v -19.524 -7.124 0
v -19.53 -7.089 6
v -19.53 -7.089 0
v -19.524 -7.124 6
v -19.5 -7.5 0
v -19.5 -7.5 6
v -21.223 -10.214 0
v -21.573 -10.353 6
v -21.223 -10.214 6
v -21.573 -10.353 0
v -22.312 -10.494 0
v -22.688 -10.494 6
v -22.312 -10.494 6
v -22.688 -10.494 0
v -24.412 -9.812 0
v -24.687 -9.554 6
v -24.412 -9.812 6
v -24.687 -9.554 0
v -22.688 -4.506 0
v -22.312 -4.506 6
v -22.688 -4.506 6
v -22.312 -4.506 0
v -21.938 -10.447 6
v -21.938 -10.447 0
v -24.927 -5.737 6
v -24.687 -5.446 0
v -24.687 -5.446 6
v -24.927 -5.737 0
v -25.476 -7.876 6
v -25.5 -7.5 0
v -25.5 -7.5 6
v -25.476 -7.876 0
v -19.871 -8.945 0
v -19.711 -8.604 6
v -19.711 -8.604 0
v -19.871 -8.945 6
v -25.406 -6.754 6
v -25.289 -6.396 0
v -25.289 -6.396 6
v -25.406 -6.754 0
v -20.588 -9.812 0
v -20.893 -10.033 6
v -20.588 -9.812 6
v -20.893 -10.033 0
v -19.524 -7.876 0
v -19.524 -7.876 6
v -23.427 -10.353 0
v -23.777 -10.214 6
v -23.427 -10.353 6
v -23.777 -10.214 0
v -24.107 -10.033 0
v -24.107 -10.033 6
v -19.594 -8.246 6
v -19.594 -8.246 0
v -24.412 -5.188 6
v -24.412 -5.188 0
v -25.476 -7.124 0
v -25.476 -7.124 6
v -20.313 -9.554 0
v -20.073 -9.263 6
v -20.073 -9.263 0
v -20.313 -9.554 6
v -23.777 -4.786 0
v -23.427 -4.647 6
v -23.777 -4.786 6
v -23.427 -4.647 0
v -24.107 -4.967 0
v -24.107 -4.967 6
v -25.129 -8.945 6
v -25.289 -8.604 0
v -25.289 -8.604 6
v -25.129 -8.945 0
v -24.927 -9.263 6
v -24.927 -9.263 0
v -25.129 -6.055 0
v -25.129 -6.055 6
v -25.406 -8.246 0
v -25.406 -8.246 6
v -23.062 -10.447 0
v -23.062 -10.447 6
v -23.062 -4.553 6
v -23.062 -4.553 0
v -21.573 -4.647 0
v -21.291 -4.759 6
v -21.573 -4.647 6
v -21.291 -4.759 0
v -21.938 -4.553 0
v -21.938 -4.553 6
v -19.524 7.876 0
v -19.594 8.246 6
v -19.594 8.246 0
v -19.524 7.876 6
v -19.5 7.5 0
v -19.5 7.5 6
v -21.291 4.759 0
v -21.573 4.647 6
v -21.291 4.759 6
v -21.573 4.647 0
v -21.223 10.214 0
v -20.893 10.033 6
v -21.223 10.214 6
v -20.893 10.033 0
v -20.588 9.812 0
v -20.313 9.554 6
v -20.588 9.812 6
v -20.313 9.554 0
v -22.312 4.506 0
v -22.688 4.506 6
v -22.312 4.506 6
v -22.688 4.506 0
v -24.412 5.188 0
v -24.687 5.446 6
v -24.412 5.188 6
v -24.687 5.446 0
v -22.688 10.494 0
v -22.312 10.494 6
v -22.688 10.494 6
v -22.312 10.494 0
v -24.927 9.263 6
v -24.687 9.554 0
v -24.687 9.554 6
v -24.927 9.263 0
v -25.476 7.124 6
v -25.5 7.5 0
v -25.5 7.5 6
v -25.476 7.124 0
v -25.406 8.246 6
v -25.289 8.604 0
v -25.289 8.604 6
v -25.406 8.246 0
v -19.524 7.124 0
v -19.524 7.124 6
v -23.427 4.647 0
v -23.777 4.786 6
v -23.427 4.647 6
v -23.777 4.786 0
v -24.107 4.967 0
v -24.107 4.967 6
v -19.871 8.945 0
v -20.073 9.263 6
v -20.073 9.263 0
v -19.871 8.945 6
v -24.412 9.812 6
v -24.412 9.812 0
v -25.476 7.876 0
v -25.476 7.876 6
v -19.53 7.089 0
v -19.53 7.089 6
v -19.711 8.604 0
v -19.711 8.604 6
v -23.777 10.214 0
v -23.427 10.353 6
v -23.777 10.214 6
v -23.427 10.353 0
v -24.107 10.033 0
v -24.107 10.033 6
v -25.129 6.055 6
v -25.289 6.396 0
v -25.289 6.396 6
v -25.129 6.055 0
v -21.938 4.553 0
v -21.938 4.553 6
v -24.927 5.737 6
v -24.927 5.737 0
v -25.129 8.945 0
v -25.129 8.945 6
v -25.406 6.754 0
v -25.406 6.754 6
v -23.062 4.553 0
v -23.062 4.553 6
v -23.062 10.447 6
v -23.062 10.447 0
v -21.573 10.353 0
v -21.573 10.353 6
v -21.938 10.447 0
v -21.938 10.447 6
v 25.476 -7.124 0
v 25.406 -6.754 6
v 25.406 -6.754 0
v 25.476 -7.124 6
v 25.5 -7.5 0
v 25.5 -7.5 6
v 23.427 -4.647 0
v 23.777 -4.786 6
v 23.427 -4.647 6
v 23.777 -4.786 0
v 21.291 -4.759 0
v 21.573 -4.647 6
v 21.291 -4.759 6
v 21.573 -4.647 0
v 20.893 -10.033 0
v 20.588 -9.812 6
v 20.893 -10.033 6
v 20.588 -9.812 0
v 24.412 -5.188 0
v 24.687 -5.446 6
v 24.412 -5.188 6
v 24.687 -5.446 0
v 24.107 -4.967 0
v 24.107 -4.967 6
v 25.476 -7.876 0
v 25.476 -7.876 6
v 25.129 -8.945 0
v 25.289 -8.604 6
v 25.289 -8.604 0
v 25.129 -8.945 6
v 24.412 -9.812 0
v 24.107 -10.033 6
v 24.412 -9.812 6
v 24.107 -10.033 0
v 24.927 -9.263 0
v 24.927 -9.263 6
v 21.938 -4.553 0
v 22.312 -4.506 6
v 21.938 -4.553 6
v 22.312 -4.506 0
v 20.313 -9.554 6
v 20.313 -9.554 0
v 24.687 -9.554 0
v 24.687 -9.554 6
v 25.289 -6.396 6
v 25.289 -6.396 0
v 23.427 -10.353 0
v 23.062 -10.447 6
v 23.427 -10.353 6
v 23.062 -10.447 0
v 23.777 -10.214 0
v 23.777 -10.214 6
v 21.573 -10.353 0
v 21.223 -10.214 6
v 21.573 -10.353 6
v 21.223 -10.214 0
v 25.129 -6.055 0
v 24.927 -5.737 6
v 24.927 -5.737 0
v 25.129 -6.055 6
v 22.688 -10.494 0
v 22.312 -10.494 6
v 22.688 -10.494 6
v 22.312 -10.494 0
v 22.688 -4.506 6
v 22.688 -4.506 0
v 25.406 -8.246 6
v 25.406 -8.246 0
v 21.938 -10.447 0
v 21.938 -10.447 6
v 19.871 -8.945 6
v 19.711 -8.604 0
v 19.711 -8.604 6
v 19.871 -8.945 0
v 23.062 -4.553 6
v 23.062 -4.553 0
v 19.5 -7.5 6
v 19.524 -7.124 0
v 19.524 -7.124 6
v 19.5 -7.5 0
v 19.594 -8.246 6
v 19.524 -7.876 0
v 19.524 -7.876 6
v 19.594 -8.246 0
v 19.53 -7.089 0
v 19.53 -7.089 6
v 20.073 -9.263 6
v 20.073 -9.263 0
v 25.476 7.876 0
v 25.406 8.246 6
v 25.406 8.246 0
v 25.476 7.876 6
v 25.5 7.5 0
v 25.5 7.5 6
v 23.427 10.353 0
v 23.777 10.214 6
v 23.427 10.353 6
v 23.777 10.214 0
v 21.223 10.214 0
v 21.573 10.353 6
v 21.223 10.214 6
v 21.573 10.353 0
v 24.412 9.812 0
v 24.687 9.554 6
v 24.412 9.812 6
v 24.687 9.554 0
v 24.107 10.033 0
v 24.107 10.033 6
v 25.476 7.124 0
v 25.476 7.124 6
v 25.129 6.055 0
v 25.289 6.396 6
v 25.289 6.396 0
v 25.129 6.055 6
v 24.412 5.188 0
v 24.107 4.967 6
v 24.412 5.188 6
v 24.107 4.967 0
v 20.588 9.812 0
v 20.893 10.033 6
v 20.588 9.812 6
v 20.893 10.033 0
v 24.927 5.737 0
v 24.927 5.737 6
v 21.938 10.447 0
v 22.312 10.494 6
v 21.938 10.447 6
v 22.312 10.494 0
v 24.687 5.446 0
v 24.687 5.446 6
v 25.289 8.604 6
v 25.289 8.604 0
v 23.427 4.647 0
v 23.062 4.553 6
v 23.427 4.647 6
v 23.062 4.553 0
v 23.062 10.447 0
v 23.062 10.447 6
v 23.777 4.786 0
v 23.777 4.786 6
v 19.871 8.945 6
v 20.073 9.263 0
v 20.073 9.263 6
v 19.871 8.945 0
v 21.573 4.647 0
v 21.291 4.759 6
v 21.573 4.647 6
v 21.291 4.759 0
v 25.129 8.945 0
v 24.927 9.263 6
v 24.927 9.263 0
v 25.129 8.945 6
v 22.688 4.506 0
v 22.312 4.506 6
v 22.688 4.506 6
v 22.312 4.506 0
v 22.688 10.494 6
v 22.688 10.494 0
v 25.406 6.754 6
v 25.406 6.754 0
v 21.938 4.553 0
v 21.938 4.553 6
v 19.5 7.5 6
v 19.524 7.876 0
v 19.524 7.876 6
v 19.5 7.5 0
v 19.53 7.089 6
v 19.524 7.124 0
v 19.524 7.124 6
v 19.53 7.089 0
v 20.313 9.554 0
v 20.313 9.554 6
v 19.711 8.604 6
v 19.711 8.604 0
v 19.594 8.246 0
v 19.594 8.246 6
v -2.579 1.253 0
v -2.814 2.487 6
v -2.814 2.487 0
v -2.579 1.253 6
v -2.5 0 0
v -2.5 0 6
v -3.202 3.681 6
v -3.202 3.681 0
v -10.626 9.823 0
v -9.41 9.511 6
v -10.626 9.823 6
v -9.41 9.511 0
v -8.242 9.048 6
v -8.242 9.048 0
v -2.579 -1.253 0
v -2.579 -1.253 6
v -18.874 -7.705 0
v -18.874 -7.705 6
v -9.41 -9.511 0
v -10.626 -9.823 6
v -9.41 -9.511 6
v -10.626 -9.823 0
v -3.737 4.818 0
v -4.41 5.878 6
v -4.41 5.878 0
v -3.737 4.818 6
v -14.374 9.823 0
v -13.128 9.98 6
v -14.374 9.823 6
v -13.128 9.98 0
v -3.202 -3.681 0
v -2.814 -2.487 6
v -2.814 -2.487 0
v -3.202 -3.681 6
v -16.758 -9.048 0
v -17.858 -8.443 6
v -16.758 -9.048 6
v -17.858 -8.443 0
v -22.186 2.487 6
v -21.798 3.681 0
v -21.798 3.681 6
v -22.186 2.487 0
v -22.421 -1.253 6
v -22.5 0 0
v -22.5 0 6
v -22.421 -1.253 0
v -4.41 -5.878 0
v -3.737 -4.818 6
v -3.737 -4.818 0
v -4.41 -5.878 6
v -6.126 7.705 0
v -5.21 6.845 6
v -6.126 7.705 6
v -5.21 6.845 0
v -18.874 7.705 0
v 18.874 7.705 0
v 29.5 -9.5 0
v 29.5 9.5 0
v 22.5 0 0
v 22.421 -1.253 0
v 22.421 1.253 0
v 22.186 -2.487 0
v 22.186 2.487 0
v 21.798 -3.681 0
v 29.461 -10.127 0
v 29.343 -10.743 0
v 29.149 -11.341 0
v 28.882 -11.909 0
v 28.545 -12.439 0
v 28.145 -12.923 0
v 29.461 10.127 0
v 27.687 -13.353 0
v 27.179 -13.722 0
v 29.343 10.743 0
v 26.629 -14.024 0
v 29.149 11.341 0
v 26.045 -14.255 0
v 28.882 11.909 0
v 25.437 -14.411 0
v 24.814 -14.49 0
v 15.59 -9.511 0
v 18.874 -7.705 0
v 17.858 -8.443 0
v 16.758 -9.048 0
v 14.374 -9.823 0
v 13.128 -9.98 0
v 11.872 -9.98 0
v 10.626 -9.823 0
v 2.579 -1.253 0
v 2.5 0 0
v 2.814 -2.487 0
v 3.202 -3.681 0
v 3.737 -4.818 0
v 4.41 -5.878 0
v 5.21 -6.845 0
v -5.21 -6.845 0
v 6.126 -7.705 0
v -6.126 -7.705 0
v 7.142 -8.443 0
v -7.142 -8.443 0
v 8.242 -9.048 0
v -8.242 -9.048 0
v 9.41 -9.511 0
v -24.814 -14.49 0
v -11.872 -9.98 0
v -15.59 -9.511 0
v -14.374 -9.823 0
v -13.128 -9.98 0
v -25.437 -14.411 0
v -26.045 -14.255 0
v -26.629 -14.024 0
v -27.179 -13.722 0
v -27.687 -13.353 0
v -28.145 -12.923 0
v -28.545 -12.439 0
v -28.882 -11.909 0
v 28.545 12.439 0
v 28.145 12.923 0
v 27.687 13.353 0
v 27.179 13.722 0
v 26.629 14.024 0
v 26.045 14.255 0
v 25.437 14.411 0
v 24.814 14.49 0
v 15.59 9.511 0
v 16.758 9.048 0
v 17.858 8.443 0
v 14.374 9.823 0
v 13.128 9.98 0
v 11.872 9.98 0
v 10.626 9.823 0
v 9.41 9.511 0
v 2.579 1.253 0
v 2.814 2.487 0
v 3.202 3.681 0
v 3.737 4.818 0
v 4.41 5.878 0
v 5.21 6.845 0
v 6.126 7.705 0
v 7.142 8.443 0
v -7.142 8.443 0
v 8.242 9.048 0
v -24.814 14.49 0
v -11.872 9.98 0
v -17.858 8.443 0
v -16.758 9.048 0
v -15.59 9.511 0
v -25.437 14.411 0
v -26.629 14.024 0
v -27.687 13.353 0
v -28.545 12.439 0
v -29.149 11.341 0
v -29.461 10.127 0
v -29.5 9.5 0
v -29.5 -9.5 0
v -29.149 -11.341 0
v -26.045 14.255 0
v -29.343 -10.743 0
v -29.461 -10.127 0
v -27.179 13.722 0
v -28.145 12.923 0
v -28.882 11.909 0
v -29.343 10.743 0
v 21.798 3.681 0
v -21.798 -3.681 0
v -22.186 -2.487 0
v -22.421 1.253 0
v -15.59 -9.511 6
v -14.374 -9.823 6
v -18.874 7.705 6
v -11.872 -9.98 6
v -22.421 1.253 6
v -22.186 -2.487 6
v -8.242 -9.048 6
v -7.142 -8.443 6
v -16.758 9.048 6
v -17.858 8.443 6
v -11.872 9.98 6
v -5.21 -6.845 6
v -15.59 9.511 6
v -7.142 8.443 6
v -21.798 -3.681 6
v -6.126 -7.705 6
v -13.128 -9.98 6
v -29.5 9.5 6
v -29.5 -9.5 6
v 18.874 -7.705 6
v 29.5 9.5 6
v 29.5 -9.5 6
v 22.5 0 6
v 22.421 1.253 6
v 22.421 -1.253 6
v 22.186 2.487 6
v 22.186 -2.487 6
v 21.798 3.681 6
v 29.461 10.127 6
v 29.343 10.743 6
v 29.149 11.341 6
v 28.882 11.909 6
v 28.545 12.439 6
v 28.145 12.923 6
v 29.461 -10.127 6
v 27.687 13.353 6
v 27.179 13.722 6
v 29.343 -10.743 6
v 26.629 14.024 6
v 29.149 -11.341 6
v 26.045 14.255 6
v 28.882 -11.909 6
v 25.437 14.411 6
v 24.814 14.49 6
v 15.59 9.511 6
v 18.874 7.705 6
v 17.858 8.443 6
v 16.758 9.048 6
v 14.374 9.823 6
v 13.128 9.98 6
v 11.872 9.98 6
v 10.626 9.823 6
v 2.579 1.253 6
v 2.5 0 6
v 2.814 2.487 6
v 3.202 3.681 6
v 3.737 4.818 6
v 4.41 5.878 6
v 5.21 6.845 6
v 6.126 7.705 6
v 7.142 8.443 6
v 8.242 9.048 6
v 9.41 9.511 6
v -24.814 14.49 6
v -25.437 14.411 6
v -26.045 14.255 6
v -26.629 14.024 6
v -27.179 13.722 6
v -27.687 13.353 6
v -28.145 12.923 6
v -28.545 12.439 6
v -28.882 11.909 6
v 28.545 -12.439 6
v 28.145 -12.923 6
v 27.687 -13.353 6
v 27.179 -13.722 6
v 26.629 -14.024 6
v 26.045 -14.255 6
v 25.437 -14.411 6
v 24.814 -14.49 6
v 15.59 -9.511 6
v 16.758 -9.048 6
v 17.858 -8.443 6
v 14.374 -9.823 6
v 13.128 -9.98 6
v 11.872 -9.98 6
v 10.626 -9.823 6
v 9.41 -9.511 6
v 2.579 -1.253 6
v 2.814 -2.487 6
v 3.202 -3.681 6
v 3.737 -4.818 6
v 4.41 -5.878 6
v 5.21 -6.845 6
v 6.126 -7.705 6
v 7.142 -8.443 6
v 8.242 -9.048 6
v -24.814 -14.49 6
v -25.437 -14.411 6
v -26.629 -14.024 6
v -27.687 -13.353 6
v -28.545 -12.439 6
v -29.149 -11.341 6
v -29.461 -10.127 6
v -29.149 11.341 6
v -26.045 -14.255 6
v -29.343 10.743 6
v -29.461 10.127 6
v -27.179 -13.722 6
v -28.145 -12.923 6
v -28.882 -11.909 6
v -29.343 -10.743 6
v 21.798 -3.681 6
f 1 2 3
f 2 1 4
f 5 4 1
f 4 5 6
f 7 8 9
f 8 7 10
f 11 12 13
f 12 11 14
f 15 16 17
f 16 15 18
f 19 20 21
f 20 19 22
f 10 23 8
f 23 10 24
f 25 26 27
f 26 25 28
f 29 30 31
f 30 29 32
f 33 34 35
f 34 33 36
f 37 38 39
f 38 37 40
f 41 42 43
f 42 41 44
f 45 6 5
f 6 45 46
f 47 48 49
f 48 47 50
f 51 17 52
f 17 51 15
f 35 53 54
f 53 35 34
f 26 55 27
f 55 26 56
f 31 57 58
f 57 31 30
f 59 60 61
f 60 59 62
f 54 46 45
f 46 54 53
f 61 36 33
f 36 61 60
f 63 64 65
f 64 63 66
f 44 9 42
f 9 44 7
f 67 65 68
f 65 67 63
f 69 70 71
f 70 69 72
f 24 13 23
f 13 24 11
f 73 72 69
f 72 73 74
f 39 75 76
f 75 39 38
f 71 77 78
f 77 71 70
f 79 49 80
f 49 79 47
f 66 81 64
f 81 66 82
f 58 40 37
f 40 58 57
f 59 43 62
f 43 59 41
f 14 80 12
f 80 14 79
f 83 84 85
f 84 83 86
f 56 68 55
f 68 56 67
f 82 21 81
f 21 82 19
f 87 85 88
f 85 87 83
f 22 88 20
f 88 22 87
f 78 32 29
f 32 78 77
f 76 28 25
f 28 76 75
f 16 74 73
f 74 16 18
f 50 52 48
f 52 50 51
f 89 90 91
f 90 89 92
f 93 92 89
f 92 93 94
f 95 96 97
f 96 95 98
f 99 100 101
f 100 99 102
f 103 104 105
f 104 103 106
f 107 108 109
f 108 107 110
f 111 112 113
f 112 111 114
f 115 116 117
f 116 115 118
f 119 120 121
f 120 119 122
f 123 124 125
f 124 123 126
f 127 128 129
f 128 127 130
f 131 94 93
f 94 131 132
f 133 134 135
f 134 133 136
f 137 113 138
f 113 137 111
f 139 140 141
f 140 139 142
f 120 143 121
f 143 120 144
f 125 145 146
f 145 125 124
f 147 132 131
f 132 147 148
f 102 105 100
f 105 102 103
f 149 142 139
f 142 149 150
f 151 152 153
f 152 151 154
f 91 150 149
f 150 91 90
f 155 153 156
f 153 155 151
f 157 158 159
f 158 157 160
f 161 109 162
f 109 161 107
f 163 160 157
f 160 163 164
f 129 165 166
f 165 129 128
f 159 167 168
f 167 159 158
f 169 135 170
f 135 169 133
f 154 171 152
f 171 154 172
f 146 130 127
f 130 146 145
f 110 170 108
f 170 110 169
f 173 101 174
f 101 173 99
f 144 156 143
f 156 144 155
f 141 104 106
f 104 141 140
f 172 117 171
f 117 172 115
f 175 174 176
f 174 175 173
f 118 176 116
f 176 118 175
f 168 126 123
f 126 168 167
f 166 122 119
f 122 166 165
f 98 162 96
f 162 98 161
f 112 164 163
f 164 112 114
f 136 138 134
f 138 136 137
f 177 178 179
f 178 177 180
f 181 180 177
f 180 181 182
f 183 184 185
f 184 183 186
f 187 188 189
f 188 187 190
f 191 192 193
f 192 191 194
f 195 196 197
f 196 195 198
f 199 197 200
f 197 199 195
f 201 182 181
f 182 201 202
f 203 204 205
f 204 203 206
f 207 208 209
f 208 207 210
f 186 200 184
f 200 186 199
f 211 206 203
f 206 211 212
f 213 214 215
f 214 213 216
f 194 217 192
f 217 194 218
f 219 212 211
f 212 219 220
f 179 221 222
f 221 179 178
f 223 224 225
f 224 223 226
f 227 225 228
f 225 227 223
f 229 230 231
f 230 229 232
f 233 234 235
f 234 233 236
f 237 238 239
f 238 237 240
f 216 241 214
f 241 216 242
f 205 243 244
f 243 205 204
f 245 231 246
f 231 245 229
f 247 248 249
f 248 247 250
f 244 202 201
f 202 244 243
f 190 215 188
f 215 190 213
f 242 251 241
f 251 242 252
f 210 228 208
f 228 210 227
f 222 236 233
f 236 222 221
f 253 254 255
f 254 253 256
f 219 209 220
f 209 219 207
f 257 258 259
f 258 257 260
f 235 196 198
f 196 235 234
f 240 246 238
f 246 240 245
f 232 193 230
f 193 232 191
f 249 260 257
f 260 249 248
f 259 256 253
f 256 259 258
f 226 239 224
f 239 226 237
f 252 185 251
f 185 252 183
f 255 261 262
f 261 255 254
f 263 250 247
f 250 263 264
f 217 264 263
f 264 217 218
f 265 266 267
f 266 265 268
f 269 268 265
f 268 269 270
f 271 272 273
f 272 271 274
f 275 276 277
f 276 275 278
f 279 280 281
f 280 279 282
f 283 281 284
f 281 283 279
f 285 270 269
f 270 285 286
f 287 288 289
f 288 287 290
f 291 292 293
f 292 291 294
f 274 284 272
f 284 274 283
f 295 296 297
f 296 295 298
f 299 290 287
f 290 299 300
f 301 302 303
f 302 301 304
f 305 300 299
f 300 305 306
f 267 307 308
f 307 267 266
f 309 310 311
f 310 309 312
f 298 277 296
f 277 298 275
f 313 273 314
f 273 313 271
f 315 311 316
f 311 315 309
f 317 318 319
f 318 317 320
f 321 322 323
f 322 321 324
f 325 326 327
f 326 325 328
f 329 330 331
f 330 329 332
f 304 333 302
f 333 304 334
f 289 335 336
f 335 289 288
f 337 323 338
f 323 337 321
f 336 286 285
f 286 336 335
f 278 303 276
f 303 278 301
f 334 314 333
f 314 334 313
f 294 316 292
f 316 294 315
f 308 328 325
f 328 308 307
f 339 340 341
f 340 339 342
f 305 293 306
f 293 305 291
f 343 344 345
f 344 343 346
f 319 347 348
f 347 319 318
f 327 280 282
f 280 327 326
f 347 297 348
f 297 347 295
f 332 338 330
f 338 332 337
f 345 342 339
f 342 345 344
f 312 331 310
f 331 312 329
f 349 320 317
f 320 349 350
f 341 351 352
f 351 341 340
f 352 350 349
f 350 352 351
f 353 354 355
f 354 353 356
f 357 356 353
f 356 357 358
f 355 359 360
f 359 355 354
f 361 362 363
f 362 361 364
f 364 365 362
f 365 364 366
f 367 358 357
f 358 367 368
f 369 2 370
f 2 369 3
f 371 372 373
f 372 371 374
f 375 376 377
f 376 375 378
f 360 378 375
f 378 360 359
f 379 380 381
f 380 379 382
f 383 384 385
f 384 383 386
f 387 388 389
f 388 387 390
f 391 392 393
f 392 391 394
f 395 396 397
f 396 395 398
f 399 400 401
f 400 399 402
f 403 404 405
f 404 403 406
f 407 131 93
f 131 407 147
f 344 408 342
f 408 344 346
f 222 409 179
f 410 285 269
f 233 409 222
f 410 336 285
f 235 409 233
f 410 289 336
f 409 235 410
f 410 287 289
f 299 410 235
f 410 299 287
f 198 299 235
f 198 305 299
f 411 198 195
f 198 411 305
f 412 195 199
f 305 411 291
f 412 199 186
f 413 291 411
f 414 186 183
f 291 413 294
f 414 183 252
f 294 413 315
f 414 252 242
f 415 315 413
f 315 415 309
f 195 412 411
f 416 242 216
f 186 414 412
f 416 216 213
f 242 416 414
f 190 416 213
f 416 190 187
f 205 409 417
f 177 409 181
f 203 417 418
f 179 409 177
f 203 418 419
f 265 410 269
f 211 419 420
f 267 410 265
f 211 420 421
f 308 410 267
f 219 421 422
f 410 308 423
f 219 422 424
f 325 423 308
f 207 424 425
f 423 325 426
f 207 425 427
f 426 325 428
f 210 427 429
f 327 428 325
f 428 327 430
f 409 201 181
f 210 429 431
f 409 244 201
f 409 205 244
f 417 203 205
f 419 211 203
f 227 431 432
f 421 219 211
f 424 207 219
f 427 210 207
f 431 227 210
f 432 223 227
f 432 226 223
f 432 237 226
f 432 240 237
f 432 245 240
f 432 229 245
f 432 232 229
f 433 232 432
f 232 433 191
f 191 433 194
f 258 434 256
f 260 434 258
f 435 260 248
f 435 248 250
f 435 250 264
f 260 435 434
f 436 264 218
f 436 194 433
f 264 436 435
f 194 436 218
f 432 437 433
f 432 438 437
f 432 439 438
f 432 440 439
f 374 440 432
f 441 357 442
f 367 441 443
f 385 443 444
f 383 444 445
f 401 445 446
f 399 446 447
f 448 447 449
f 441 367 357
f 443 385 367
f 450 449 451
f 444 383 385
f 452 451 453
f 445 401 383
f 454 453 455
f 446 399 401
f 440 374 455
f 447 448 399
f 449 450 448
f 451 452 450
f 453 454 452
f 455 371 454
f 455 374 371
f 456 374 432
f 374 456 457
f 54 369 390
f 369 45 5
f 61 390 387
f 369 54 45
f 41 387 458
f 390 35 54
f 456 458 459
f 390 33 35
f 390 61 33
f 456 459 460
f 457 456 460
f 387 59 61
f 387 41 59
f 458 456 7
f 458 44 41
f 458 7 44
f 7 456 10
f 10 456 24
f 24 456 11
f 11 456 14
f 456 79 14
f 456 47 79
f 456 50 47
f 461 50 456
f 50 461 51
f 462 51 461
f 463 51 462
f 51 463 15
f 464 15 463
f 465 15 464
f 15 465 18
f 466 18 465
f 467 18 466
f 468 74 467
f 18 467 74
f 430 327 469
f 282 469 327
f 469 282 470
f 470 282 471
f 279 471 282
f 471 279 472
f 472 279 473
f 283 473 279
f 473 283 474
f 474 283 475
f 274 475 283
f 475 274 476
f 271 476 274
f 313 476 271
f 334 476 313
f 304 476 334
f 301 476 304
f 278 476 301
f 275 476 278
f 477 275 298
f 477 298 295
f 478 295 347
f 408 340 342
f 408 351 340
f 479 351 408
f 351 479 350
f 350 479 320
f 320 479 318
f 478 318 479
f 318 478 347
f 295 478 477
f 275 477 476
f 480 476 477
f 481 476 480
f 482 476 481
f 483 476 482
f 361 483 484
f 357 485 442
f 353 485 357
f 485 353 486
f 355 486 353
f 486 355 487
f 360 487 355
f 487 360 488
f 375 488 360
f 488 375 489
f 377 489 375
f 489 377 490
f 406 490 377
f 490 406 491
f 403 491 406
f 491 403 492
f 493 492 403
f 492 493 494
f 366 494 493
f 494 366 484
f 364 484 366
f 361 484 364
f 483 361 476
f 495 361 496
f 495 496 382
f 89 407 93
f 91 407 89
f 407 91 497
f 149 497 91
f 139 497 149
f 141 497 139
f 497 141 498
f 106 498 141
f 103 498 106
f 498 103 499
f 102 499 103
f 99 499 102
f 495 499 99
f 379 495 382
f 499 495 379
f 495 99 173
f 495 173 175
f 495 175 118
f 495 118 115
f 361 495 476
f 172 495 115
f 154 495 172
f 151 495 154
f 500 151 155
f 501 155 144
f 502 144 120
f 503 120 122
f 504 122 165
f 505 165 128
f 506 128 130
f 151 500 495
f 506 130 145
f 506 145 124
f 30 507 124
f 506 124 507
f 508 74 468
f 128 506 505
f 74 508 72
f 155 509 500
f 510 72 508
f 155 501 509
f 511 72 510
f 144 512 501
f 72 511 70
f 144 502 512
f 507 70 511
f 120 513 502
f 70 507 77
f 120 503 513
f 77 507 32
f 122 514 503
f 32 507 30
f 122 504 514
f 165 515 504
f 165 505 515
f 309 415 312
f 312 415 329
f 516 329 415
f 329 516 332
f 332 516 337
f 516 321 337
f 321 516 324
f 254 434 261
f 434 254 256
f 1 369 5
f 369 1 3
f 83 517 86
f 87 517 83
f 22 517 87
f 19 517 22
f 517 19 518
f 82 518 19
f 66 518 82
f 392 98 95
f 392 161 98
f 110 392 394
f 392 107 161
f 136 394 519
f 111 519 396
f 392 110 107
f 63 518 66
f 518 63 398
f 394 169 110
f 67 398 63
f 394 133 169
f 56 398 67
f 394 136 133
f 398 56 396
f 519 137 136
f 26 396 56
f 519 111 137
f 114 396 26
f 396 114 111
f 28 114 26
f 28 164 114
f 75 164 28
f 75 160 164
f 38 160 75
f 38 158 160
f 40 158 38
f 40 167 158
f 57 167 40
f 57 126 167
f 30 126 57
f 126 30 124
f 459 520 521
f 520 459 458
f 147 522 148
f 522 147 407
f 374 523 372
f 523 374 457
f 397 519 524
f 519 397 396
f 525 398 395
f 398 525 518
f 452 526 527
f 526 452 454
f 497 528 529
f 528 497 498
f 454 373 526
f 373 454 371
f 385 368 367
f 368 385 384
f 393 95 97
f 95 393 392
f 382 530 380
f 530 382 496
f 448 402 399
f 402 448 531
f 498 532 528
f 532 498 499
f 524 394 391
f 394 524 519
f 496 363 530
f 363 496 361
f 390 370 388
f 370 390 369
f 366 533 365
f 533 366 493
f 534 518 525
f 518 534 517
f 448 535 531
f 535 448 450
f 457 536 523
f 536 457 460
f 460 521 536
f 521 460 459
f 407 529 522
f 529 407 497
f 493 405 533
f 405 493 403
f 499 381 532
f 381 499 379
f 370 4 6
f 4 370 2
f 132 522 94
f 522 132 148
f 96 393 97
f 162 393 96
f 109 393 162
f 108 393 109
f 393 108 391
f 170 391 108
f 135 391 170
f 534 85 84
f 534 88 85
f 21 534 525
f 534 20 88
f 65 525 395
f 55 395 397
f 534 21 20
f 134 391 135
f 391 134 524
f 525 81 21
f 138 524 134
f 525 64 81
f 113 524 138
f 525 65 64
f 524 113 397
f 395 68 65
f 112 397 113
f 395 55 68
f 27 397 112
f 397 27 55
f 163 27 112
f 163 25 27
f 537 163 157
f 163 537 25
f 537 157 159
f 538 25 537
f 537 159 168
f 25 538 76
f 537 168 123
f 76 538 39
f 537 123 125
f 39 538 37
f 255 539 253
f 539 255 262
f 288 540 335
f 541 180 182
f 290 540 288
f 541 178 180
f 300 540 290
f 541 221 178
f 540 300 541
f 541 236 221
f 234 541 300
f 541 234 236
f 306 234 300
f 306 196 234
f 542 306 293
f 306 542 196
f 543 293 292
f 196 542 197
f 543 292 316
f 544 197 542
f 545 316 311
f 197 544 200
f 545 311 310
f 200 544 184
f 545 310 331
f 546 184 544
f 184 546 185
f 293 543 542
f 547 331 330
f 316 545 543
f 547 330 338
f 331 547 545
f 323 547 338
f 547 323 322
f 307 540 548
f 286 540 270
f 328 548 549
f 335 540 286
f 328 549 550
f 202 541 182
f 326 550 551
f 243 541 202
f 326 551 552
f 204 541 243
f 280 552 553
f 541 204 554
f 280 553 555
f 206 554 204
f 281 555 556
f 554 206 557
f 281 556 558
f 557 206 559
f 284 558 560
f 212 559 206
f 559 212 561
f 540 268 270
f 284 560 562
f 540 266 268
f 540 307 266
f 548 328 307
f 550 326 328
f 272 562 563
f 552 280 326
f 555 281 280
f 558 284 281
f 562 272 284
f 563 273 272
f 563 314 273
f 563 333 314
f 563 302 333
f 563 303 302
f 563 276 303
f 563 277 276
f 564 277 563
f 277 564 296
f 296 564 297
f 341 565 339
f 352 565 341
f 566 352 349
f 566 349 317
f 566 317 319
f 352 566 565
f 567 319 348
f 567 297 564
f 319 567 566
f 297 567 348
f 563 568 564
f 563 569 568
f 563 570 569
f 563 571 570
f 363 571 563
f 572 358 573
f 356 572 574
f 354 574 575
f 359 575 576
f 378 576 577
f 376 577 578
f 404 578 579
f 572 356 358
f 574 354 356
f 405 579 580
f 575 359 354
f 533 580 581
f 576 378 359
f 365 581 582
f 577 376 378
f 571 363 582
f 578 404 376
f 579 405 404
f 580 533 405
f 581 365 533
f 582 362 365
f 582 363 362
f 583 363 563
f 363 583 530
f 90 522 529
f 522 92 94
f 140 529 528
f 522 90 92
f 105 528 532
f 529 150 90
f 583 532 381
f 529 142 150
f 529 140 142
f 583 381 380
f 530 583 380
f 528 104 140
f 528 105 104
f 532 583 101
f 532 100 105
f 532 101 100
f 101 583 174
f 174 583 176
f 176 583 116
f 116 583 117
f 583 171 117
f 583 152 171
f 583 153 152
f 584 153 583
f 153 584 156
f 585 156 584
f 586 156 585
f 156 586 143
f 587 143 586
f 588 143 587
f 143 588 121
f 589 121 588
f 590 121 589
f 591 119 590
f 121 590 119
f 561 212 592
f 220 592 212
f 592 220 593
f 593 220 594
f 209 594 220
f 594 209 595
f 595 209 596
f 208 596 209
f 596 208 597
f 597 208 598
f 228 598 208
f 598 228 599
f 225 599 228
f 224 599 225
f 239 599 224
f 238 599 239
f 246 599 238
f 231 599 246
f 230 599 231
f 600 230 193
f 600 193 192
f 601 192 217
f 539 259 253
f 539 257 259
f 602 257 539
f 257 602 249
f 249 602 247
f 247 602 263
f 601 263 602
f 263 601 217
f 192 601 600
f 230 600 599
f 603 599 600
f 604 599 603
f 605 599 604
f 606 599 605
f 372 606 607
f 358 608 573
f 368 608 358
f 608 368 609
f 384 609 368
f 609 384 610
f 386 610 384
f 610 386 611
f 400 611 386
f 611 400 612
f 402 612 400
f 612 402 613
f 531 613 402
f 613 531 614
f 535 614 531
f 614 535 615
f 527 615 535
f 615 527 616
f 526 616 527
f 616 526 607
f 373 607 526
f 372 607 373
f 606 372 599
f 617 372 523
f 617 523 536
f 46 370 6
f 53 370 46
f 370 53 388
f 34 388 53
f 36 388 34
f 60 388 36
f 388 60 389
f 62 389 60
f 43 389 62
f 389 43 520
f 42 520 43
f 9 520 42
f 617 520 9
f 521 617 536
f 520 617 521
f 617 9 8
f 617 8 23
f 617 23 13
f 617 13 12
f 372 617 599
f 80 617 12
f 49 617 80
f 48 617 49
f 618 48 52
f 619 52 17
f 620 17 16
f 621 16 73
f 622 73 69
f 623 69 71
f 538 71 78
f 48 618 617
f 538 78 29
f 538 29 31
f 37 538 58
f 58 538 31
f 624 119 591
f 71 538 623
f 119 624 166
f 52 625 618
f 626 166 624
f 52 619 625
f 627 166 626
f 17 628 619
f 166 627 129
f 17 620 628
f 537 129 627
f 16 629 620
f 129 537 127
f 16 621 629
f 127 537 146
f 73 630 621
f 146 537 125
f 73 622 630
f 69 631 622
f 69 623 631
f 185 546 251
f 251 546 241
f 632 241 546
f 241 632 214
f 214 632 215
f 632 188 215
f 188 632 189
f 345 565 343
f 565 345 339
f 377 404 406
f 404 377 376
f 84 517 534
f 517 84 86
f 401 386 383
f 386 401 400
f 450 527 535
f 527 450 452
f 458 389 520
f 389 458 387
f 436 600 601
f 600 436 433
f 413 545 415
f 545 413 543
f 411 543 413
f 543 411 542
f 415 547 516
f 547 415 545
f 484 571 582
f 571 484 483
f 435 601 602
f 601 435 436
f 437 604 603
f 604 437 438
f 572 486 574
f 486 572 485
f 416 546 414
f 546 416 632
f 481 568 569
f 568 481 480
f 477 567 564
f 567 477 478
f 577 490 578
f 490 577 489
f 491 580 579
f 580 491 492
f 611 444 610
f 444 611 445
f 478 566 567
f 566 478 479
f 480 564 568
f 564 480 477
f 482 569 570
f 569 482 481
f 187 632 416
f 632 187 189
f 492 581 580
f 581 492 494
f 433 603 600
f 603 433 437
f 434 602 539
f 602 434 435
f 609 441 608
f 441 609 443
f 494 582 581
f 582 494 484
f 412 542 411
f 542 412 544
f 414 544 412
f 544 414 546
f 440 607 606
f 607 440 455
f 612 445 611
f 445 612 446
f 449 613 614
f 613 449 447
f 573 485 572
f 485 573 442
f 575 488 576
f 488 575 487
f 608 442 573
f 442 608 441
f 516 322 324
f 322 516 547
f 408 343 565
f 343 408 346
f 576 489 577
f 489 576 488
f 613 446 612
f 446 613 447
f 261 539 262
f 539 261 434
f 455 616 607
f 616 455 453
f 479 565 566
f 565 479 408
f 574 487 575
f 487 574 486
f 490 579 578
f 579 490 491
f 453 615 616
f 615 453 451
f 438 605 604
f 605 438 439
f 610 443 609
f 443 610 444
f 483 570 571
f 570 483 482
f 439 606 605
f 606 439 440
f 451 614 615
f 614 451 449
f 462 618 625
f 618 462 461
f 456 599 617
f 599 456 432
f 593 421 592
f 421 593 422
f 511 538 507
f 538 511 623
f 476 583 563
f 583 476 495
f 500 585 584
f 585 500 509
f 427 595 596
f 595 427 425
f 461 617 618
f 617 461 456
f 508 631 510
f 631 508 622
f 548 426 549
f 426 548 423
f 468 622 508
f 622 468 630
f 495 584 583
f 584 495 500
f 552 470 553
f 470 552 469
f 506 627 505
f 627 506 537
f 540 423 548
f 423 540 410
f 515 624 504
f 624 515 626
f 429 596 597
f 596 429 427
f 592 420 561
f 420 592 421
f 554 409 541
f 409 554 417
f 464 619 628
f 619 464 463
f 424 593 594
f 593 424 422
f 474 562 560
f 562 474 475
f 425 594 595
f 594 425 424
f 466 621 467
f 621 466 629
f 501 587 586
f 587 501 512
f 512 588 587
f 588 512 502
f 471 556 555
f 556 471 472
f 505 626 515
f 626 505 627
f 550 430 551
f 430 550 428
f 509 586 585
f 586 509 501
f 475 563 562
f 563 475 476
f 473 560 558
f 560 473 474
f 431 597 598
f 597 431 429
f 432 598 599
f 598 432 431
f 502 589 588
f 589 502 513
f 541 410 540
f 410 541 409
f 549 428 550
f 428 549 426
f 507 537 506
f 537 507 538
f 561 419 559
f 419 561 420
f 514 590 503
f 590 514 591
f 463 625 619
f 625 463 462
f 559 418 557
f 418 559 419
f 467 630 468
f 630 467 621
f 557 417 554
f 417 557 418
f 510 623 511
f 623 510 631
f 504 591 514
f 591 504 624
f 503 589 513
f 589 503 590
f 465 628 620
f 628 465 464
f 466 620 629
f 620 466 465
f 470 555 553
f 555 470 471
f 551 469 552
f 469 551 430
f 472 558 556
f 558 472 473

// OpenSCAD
$fn = 50;


difference() {
	union() {
		hull() {
			translate(v = [-24.5000000000, 9.5000000000, 0]) {
				cylinder(h = 6, r = 5);
			}
			translate(v = [24.5000000000, 9.5000000000, 0]) {
				cylinder(h = 6, r = 5);
			}
			translate(v = [-24.5000000000, -9.5000000000, 0]) {
				cylinder(h = 6, r = 5);
			}
			translate(v = [24.5000000000, -9.5000000000, 0]) {
				cylinder(h = 6, r = 5);
			}
		}
	}
	union() {
		#translate(v = [-22.5000000000, -7.5000000000, -100.0000000000]) {
			cylinder(h = 200, r = 3.0000000000);
		}
		#translate(v = [-22.5000000000, 7.5000000000, -100.0000000000]) {
			cylinder(h = 200, r = 3.0000000000);
		}
		#translate(v = [22.5000000000, -7.5000000000, -100.0000000000]) {
			cylinder(h = 200, r = 3.0000000000);
		}
		#translate(v = [22.5000000000, 7.5000000000, -100.0000000000]) {
			cylinder(h = 200, r = 3.0000000000);
		}
		#translate(v = [-12.5000000000, 0, 0]) {
			cylinder(h = 6, r = 10.0000000000);
		}
		#translate(v = [12.5000000000, 0, 0]) {
			cylinder(h = 6, r = 10.0000000000);
		}
	}
}
